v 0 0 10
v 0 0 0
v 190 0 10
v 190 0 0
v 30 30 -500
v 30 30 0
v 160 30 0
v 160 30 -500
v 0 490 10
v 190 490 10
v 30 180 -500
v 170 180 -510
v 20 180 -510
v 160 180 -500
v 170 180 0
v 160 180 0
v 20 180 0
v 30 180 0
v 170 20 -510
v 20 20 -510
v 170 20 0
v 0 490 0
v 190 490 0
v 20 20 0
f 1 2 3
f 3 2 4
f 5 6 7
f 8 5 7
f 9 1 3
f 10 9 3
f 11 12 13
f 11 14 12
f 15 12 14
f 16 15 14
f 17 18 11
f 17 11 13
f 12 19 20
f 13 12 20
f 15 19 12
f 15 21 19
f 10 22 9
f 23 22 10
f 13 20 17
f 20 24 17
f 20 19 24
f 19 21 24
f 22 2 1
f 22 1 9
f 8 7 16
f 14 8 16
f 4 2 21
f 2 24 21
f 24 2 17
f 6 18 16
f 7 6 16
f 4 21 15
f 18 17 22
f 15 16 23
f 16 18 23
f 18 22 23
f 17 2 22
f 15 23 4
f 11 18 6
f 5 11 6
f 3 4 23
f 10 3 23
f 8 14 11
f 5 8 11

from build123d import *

# Parameters (mm, degrees)
SKETCH_1_W      = 190
SKETCH_1_H      = 490
EXTRUDE_1_DEPTH = 10
EXTRUDE_2_DEPTH = 500
SKETCH_3_W      = 150
SKETCH_3_H      = 160
EXTRUDE_3_DEPTH = 10


with BuildPart() as part:
    # Эскиз1 → Бобышка-Вытянуть1 (new body)
    with BuildSketch(Plane.XY):
        with Locations((95, 245)):
            Rectangle(SKETCH_1_W, SKETCH_1_H)
    extrude(amount=EXTRUDE_1_DEPTH)

    # Эскиз2 → Бобышка-Вытянуть2 (add)
    with BuildSketch(Plane(origin=(0, 0, 0), x_dir=(-1, 0, 0), z_dir=(0, 0, -1))):
        Polygon((-170, 180), (-170, 20), (-20, 20), (-20, 180), (-30, 180), (-30, 30), (-160, 30), (-160, 180), align=None)
    extrude(amount=EXTRUDE_2_DEPTH)

    # Эскиз3 → Бобышка-Вытянуть3 (add)
    with BuildSketch(Plane(origin=(0, 0, -500), x_dir=(-1, 0, 0), z_dir=(0, 0, -1))):
        with Locations((-95, 100)):
            Rectangle(SKETCH_3_W, SKETCH_3_H)
    extrude(amount=EXTRUDE_3_DEPTH)


solid = part.part
